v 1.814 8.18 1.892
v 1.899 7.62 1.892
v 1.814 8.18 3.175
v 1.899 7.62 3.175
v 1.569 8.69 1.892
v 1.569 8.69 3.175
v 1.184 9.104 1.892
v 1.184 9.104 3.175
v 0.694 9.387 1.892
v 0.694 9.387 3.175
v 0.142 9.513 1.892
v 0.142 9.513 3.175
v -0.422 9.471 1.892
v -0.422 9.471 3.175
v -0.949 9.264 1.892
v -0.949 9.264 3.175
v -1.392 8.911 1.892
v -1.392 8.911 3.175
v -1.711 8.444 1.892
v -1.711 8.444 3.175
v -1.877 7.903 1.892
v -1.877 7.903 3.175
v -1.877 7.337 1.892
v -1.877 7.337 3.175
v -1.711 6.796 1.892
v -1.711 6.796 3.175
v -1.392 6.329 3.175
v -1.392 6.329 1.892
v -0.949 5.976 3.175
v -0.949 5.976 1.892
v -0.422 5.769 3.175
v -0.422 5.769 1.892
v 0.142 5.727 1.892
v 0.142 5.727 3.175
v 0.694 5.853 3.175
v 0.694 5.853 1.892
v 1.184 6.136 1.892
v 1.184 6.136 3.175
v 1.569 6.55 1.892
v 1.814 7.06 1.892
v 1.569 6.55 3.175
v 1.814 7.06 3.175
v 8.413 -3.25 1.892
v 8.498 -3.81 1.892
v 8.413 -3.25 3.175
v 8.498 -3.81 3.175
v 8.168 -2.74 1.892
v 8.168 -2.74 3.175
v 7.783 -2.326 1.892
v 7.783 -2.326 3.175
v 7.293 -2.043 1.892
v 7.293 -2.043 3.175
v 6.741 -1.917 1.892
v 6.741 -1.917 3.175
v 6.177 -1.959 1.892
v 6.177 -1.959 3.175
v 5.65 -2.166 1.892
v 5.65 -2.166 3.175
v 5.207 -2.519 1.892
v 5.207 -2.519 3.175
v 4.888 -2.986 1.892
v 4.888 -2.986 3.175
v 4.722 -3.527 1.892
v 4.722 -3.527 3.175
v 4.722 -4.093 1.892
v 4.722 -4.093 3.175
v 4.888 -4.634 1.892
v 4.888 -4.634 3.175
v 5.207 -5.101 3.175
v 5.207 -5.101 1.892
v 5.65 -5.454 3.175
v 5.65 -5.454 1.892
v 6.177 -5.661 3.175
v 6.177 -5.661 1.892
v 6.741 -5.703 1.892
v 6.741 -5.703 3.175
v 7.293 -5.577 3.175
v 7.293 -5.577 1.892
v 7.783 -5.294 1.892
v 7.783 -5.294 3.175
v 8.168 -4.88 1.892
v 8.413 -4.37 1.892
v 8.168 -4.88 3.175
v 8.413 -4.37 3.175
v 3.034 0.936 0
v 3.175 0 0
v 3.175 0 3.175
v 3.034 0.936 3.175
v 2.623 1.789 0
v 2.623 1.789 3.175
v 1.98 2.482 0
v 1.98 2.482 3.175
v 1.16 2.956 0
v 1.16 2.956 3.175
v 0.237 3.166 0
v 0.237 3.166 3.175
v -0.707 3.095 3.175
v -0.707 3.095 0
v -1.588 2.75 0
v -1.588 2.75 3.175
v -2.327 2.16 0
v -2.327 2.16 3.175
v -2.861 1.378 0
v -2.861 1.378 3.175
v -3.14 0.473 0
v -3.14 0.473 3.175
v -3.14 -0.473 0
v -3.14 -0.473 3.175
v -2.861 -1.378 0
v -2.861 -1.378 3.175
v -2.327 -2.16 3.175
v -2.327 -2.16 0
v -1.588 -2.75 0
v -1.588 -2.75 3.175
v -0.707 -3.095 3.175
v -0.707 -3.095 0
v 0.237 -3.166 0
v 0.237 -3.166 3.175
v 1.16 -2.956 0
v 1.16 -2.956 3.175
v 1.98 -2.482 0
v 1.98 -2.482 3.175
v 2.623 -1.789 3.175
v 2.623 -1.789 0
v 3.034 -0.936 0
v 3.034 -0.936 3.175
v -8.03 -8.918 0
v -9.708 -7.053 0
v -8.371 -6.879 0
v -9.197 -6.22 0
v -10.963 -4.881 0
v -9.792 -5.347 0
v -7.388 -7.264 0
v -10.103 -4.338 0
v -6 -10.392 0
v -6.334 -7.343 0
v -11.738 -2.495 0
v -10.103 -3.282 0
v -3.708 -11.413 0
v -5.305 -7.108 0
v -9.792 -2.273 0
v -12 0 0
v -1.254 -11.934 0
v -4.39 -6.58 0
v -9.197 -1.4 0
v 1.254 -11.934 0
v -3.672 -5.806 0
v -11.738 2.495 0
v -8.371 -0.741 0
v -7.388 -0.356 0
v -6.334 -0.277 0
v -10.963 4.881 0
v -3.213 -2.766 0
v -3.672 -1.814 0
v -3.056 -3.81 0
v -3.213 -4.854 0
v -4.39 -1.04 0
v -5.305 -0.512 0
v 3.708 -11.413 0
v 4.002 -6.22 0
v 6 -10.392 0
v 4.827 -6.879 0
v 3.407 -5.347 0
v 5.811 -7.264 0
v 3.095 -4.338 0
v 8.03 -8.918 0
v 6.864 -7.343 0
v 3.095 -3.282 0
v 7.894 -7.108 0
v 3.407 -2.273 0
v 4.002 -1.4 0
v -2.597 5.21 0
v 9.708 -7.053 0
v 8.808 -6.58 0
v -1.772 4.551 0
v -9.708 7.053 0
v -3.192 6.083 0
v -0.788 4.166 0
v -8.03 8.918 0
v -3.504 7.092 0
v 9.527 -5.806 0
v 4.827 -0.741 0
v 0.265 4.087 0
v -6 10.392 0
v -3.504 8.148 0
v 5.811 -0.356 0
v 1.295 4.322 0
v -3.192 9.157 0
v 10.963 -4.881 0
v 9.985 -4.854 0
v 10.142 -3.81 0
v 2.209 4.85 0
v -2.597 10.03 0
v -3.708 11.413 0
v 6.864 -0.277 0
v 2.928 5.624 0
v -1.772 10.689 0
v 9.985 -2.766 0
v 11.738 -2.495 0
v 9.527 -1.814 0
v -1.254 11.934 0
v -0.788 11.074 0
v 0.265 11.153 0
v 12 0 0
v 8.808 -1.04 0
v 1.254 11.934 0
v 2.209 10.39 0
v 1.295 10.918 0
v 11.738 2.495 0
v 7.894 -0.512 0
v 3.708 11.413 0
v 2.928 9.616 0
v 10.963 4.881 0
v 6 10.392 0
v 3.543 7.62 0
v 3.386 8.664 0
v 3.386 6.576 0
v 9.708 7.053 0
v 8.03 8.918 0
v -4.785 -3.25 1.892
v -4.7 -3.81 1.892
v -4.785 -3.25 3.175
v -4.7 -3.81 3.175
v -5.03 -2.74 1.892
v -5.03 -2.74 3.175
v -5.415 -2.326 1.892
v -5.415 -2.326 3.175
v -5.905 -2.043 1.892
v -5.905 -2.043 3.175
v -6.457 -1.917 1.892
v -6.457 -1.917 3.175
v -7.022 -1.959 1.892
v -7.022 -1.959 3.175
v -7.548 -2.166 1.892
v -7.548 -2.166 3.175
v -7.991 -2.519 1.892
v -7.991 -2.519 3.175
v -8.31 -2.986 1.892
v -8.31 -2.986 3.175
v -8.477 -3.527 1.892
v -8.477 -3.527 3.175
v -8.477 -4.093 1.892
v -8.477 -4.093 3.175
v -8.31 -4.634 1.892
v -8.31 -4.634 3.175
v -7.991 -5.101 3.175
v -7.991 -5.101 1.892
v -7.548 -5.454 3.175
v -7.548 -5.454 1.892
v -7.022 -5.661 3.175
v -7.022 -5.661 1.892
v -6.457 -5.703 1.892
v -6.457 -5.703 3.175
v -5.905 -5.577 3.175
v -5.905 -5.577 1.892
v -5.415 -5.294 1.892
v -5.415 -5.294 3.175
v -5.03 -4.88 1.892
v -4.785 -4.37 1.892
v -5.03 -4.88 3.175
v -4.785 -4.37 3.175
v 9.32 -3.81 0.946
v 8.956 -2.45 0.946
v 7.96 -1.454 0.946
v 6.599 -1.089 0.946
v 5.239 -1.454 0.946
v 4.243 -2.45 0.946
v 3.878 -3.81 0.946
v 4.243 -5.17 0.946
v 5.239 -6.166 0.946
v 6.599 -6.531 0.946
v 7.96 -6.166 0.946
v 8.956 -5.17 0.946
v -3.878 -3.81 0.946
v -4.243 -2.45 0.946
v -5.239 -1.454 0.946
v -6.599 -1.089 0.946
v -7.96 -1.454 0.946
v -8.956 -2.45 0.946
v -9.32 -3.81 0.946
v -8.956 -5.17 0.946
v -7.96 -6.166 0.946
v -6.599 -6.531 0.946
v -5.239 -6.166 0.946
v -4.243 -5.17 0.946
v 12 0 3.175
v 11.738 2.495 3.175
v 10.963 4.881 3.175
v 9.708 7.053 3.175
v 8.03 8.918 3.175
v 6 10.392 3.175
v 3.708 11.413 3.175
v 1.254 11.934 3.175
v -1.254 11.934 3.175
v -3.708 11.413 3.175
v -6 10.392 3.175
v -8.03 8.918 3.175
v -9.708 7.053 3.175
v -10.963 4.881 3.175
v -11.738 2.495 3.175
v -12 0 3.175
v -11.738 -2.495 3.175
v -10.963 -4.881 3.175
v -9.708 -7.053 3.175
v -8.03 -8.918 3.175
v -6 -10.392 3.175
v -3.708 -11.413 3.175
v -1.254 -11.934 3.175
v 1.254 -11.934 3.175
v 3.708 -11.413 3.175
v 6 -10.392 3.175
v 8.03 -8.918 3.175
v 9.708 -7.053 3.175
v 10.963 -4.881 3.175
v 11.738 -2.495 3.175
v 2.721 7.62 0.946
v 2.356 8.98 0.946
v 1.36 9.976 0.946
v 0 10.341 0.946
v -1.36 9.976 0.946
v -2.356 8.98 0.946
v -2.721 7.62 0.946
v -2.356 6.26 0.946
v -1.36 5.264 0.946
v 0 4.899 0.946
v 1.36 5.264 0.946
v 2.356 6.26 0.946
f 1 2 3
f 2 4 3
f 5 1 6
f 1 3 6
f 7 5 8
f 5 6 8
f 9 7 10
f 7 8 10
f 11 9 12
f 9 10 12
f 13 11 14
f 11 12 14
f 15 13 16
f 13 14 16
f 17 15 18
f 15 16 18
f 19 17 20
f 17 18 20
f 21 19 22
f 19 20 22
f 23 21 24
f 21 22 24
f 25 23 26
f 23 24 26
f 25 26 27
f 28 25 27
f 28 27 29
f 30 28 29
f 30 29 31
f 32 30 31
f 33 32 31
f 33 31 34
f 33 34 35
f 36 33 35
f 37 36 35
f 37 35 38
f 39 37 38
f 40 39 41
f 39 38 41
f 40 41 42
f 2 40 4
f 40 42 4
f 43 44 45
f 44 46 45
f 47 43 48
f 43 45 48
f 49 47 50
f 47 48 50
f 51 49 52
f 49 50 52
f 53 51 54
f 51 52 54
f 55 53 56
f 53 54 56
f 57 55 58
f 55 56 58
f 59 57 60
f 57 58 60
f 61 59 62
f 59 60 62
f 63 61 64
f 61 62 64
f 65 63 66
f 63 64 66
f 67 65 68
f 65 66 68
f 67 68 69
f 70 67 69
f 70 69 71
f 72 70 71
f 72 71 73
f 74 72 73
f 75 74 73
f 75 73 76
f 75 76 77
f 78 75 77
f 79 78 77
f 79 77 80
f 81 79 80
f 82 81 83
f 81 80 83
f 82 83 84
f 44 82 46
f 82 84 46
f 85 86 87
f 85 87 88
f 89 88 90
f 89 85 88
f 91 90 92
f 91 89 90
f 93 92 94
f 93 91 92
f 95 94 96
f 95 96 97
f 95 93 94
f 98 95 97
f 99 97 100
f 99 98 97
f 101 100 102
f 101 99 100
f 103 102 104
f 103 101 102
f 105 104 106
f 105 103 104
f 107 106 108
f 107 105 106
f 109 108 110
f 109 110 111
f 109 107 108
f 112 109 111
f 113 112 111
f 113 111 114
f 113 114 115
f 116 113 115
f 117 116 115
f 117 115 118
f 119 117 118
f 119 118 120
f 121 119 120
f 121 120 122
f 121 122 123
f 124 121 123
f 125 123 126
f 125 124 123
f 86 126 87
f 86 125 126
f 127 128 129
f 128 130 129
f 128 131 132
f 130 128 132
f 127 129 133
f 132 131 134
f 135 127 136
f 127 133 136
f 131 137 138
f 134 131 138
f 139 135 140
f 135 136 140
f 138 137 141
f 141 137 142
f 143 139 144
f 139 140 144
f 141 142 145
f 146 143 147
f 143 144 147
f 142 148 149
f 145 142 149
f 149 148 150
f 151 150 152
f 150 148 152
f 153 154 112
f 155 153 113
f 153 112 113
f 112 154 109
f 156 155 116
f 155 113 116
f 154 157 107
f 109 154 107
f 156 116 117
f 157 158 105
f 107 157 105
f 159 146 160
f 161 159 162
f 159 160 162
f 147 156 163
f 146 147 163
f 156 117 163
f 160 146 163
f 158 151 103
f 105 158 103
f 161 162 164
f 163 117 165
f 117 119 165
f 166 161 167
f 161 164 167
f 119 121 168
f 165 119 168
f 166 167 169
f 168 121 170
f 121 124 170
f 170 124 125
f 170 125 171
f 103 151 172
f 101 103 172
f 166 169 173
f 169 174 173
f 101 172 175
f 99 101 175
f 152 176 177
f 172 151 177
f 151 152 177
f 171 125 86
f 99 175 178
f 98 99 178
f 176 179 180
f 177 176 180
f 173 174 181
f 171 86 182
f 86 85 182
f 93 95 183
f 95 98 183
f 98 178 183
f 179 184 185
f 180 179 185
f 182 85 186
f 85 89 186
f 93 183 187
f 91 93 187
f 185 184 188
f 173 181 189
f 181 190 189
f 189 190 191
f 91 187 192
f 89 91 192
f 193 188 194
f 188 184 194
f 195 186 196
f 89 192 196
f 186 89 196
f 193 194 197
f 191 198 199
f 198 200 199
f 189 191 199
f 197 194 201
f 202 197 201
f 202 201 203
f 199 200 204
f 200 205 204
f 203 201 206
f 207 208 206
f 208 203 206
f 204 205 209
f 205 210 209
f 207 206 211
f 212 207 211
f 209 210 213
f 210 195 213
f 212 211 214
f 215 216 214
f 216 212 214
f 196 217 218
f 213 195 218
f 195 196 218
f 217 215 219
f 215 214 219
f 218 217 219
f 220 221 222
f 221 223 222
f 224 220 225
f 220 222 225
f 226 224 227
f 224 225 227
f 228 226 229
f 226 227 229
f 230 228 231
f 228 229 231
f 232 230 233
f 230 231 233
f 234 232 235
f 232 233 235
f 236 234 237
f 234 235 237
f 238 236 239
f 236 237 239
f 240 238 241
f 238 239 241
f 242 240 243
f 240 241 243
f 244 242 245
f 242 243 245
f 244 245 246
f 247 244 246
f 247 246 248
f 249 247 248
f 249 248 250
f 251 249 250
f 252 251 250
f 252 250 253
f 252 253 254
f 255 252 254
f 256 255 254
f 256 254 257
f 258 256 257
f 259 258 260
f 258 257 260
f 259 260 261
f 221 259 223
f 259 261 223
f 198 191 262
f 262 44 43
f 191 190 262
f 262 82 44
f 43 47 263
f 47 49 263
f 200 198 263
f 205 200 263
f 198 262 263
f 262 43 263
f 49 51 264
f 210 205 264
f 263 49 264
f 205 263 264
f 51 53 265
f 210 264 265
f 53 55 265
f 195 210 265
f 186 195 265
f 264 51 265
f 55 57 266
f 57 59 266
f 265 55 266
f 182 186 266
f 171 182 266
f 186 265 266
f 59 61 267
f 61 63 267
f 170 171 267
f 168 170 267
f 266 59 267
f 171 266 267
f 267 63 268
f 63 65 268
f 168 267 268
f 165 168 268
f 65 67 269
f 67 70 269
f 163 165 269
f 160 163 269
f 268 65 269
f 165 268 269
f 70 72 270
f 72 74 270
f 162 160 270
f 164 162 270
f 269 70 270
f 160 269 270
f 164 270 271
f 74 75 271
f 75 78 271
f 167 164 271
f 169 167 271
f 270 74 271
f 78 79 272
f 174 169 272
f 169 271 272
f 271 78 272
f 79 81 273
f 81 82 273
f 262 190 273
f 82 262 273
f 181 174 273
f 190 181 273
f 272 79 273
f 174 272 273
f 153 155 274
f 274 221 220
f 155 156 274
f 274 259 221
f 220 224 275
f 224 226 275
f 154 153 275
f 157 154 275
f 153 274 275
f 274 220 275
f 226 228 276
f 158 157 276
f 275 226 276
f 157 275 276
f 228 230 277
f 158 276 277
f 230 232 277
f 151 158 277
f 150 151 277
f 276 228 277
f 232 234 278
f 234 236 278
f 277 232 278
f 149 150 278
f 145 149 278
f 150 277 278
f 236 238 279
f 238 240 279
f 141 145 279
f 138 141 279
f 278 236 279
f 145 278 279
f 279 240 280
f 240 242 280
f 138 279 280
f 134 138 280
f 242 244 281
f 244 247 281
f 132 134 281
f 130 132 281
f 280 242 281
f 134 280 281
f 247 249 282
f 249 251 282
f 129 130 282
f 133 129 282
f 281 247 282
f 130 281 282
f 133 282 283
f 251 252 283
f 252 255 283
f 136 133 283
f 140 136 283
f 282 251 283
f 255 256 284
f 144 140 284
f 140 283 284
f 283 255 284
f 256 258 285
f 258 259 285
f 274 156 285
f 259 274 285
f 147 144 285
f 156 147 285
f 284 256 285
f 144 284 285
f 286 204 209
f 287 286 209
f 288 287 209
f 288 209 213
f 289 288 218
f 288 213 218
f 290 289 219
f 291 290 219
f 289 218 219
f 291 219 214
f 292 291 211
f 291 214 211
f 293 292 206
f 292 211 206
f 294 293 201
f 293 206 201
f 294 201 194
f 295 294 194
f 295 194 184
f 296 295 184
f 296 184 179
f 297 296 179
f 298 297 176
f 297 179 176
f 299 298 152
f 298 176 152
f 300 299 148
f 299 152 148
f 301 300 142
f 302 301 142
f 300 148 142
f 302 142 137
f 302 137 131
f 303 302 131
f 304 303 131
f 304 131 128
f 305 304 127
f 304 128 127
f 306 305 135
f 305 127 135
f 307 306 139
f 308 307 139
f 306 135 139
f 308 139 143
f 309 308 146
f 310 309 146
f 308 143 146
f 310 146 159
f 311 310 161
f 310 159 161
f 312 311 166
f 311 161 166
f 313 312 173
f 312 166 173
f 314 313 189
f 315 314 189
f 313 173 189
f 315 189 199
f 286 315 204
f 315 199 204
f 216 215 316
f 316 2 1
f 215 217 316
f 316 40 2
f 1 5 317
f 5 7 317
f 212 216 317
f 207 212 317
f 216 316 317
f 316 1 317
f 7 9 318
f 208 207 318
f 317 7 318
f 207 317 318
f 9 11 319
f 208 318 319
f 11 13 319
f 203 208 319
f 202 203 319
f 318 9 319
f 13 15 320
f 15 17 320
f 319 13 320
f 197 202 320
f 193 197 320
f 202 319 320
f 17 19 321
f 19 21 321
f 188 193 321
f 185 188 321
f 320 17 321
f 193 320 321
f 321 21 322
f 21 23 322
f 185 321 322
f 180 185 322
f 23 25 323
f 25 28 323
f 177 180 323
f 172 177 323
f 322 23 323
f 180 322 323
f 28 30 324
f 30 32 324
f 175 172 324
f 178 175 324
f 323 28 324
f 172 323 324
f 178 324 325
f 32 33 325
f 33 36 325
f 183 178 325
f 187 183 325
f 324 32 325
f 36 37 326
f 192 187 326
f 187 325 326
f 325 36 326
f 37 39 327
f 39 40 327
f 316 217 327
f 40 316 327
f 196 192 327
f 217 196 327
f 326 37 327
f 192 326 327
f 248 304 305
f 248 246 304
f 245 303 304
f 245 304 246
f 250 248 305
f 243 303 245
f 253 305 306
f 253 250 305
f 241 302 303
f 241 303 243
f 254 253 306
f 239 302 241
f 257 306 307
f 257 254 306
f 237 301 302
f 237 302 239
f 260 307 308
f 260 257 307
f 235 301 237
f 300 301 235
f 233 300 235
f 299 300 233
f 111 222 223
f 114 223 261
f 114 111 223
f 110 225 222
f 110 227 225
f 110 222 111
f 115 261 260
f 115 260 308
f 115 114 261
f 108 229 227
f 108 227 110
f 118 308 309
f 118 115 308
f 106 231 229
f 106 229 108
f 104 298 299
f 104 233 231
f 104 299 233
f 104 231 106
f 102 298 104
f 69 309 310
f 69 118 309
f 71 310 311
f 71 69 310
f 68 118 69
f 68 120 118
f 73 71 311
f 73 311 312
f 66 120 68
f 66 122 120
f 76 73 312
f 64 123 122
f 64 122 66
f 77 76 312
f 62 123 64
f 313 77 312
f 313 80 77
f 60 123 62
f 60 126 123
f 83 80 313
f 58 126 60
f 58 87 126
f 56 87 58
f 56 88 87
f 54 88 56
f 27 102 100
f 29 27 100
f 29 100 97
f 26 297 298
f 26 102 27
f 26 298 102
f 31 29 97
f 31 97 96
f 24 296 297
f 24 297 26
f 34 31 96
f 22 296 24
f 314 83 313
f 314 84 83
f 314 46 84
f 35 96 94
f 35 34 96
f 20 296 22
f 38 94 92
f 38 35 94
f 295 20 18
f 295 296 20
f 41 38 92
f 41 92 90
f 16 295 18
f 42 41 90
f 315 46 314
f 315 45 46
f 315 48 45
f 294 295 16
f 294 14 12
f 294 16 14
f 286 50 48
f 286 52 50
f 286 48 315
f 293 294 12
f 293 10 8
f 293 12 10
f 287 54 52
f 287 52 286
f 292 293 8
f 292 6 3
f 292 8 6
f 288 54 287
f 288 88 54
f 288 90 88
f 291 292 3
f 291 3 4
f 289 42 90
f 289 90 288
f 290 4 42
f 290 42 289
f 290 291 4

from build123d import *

# Parameters (mm, degrees)
SKETCH1_R                                      = 12
SKETCH1_R_2                                    = 3.175
BOSS_EXTRUDE1_DEPTH                            = 3.175
CSK_FOR_6_FLAT_HEAD_MACHINE_SCREW1_D           = 3.7973
CSK_FOR_6_FLAT_HEAD_MACHINE_SCREW1_DEPTH       = 10.973
CSK_FOR_6_FLAT_HEAD_MACHINE_SCREW1_CSINK_D     = 7.0866
CSK_FOR_6_FLAT_HEAD_MACHINE_SCREW1_CSINK_ANGLE = 82
CSK_FOR_6_FLAT_HEAD_MACHINE_SCREW1_TIP         = 1.140824014


with BuildPart() as part:
    # Sketch1 → Boss-Extrude1 (new body)
    with BuildSketch(Plane.XY):
        Circle(SKETCH1_R)
        Circle(SKETCH1_R_2, mode=Mode.SUBTRACT)
    extrude(amount=BOSS_EXTRUDE1_DEPTH)

    # CSK for #6 Flat Head Machine Screw1
    with Locations(Plane(origin=(0, 0, 0), x_dir=(-1, 0, 0), z_dir=(0, 0, -1))):
        with Locations((0, 7.62), (-6.599113577, -3.81), (6.599113577, -3.81)):
            CounterSinkHole(CSK_FOR_6_FLAT_HEAD_MACHINE_SCREW1_D / 2, CSK_FOR_6_FLAT_HEAD_MACHINE_SCREW1_CSINK_D / 2, depth=CSK_FOR_6_FLAT_HEAD_MACHINE_SCREW1_DEPTH, counter_sink_angle=CSK_FOR_6_FLAT_HEAD_MACHINE_SCREW1_CSINK_ANGLE)
            with Locations((0, 0, -(CSK_FOR_6_FLAT_HEAD_MACHINE_SCREW1_DEPTH + CSK_FOR_6_FLAT_HEAD_MACHINE_SCREW1_TIP / 2))):  # 118° drill point
                Cone(0, CSK_FOR_6_FLAT_HEAD_MACHINE_SCREW1_D / 2, CSK_FOR_6_FLAT_HEAD_MACHINE_SCREW1_TIP, mode=Mode.SUBTRACT)


solid = part.part
